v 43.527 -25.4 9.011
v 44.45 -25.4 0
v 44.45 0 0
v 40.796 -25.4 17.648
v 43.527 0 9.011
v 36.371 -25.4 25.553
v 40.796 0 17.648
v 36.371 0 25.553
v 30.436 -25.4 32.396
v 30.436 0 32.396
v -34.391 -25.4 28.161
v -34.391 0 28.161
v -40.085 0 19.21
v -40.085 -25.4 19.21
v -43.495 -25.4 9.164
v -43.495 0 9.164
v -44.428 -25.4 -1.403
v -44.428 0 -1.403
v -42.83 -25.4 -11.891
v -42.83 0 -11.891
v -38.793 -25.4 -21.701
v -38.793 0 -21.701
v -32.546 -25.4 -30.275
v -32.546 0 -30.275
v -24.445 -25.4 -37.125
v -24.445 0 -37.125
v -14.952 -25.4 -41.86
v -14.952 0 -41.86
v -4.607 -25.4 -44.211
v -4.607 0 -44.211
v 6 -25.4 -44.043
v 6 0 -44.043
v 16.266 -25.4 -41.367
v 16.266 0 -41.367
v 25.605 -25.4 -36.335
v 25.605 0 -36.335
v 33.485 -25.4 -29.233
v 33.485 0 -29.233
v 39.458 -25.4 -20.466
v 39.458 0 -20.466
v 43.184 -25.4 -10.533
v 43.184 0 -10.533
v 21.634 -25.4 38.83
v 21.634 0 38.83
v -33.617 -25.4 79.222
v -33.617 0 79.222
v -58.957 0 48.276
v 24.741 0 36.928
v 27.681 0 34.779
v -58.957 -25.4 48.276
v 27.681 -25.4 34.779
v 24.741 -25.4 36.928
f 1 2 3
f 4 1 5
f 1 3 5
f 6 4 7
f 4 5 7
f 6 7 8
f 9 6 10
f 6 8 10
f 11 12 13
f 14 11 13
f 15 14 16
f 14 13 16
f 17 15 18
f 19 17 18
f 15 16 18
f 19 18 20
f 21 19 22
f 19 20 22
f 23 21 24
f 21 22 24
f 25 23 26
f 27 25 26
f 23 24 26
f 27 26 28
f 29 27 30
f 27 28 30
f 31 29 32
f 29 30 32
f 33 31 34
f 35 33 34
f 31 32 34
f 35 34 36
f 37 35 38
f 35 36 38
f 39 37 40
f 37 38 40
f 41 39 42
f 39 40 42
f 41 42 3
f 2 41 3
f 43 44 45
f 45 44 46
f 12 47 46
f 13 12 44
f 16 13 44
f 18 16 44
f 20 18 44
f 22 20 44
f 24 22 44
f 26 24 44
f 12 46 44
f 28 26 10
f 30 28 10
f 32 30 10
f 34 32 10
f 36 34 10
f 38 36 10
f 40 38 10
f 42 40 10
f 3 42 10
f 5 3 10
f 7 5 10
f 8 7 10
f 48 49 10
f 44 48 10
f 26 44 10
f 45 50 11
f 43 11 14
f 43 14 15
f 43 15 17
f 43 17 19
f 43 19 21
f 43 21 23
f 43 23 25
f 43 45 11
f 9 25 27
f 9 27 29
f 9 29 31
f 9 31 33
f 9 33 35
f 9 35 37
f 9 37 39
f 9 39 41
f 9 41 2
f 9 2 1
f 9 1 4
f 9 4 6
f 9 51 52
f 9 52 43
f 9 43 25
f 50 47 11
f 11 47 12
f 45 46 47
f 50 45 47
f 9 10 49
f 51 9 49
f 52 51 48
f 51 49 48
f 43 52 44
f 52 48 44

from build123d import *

# Parameters (mm, degrees)
F1_DEPTH = 25.4


with BuildPart() as f1:
    # F0 (on Front) → F1 (new body)
    with BuildSketch(Plane.XZ):
        with BuildLine():
            Line((30.4357201419, 32.3955157304), (0, 0))
            Line((0, 0), (-34.3912951606, 28.1609892791))
            ThreePointArc((-34.3912951606, 28.1609892791), (-14.951746221, -41.8598588739), (44.45, 0))
            ThreePointArc((44.45, 0), (40.7962636789, 17.6484381701), (30.4357201419, 32.3955157304))
        make_face()
        with BuildLine():
            Line((-34.3912951606, 28.1609892791), (0, 0))
            Line((0, 0), (30.4357201419, 32.3955157304))
            Line((30.4357201419, 32.3955157304), (21.6344162972, 38.8298149812))
            ThreePointArc((21.6344162972, 38.8298149812), (-8.3150736647, 43.6653415188), (-34.3912951606, 28.1609892791))
        make_face()
        with BuildLine():
            Line((-58.9565059896, 48.2759816213), (-34.3912951606, 28.1609892791))
            ThreePointArc((-34.3912951606, 28.1609892791), (-8.3150736647, 43.6653415188), (21.6344162972, 38.8298149812))
            Line((21.6344162972, 38.8298149812), (-33.6167658697, 79.2218576031))
            Line((-33.6167658697, 79.2218576031), (-58.9565059896, 48.2759816213))
        make_face()
        with BuildLine():
            Line((21.6344162972, 38.8298149812), (30.4357201419, 32.3955157304))
            ThreePointArc((30.4357201419, 32.3955157304), (26.2330865304, 35.8835292452), (21.6344162972, 38.8298149812))
        make_face()
    extrude(amount=F1_DEPTH)


solid = f1.part
